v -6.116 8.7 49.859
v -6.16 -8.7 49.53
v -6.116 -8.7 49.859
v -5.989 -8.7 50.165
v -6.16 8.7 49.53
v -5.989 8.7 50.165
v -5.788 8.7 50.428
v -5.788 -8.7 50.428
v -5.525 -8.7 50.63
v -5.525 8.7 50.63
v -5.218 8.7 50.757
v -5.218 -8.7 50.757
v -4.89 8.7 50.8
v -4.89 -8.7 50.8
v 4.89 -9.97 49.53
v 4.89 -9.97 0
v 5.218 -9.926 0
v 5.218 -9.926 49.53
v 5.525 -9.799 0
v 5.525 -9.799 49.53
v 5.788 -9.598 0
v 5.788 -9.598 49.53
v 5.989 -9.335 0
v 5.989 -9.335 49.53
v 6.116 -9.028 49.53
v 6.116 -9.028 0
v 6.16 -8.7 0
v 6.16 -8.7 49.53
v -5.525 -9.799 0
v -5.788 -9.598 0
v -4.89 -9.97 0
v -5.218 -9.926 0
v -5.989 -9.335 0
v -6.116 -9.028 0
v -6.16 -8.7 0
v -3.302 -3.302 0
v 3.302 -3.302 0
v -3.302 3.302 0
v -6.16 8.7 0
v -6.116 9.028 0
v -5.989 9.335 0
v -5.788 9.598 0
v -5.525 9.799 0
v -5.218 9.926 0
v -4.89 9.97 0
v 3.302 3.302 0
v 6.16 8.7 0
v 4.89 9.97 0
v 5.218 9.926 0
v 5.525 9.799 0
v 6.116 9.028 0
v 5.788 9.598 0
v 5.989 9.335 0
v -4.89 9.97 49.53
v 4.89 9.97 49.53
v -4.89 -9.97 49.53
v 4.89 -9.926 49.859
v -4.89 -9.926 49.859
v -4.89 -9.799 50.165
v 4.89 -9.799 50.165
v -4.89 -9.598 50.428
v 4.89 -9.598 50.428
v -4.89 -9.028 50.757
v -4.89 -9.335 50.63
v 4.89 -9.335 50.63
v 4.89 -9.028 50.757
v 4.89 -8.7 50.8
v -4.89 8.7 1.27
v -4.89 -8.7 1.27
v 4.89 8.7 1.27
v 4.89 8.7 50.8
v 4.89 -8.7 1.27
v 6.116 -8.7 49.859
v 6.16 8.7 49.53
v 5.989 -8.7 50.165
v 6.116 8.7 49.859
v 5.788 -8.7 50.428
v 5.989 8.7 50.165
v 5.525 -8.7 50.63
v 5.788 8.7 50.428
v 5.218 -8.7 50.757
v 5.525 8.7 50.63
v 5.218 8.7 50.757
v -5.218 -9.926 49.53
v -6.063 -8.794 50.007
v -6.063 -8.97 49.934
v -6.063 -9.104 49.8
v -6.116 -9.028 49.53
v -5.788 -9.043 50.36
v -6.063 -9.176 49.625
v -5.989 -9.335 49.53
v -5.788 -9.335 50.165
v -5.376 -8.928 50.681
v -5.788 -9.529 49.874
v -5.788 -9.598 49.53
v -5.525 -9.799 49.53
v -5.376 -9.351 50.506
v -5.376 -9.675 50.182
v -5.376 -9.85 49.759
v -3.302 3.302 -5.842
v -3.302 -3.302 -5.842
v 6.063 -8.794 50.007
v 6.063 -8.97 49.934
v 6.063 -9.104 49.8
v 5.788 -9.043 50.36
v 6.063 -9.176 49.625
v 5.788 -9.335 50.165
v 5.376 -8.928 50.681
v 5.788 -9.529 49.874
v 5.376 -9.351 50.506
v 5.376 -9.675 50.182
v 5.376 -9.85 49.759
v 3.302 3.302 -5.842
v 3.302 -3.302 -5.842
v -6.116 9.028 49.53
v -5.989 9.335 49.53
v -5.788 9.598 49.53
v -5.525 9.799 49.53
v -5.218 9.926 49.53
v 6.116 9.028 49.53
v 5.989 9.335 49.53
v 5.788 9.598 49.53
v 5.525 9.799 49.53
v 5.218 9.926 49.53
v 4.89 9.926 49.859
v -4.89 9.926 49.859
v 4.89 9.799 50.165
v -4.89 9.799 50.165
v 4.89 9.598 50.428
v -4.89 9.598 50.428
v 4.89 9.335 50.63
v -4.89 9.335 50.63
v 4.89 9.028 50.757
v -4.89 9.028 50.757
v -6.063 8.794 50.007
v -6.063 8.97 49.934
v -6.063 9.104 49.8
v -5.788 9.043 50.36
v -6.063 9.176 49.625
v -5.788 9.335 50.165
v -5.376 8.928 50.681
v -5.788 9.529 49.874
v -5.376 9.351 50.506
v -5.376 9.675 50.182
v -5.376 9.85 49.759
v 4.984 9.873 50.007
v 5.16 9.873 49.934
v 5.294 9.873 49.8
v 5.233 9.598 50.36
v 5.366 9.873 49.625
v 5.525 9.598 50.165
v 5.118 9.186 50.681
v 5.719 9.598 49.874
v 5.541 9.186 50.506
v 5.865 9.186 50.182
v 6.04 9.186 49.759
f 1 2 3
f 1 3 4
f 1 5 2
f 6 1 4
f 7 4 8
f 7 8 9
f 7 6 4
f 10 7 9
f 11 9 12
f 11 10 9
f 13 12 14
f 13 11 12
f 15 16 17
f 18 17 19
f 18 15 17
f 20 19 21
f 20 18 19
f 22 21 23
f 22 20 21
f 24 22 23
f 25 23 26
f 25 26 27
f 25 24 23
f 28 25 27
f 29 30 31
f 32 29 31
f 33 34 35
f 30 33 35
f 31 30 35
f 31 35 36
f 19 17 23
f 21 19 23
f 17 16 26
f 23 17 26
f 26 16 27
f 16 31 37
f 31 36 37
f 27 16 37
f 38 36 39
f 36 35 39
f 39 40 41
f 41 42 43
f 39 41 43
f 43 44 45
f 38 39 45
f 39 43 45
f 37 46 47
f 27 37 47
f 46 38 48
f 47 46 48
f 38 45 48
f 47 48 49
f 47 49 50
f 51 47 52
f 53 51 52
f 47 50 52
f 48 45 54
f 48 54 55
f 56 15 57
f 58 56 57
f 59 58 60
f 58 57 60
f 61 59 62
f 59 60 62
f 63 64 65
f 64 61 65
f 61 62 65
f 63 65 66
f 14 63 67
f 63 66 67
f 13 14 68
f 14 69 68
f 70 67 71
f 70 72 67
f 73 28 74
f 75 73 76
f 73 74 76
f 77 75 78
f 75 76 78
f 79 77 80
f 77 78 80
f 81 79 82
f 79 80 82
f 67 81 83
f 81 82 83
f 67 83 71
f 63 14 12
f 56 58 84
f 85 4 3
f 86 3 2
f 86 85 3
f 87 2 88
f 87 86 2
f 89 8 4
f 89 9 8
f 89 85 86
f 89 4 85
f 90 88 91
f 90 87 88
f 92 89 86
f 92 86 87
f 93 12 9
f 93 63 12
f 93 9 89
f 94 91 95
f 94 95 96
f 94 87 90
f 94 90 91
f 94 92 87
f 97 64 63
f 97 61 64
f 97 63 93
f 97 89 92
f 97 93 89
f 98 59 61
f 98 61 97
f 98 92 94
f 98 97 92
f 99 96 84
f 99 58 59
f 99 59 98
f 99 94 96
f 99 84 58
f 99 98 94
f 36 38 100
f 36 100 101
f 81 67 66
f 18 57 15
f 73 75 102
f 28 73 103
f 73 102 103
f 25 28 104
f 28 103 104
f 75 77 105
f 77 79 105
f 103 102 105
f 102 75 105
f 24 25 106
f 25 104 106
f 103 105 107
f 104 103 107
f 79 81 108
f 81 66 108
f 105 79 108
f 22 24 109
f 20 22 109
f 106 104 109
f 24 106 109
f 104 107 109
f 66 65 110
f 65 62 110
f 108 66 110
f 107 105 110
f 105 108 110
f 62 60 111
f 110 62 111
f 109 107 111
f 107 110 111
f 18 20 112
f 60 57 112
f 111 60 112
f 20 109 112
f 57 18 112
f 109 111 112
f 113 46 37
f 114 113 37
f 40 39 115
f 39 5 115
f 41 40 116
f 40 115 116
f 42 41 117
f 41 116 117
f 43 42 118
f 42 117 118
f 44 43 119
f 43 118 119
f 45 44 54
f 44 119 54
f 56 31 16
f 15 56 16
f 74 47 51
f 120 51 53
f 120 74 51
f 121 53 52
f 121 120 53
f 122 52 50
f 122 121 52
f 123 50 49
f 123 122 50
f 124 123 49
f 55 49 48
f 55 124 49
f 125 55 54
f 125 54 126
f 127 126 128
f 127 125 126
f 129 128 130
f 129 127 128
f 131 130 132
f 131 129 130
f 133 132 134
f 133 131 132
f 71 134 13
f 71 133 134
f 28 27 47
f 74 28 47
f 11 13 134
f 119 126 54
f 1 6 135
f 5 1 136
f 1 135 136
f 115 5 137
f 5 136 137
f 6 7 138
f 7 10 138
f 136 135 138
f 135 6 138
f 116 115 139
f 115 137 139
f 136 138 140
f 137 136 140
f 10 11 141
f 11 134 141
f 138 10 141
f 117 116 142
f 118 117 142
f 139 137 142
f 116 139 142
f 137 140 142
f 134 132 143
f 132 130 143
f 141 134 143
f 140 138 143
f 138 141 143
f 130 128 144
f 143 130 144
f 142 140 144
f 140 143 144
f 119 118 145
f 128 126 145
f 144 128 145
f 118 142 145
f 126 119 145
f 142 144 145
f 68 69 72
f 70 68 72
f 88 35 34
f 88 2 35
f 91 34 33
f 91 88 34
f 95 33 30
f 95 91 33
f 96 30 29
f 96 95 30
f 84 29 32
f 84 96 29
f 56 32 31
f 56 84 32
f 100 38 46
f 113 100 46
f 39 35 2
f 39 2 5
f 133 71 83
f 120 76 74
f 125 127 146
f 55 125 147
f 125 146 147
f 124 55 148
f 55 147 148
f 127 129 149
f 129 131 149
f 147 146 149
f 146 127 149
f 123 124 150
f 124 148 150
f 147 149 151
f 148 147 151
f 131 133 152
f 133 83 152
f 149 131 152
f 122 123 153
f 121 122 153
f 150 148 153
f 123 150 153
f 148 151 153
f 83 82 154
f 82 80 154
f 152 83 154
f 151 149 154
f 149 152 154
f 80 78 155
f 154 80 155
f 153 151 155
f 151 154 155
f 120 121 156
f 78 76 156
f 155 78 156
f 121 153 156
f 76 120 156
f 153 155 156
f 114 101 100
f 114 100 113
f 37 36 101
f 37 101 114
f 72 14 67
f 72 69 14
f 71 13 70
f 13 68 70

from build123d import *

# Parameters (mm, degrees)
F0_W     = 12.319
F0_H     = 19.939
F1_DEPTH = 50.8
F2_T     = -1.27
F3_R     = 1.26999
F4_W     = 6.604
F4_H     = 6.604
F5_DEPTH = 5.842


# Not quite as in the source:
# - a fillet or chamfer is up to 0.001 mm smaller than in the source, because OpenCascade refuses the exact size


with BuildPart() as f1:
    # F0 (on Top) → F1 (new body)
    with BuildSketch(Plane.XY):
        Rectangle(F0_W, F0_H)
    extrude(amount=F1_DEPTH)

    # F2
    f2_openings = [f1.faces().sort_by_distance(p)[0] for p in [
        (0, 0, 50.8),
    ]]
    offset(amount=F2_T, openings=f2_openings)

    # F3 (radius 1.27 in the source; OpenCascade refuses exactly that, so slightly less here)
    f3_edges = [f1.edges().sort_by_distance(p)[0] for p in [
        (0, -9.9695, 50.8),
        (6.1595, 0, 50.8),
        (0, 9.9695, 50.8),
        (-6.1595, 0, 50.8),
        (-6.1595, -9.9695, 25.4),
        (6.1595, -9.9695, 25.4),
        (6.1595, 9.9695, 25.4),
        (-6.1595, 9.9695, 25.4),
    ]]
    fillet(f3_edges, radius=F3_R)

    # F4 (on face) → F5 (join)
    with BuildSketch(Plane(origin=(0, 0, 0), x_dir=(1, 0, 0), z_dir=(0, 0, -1))):
        Rectangle(F4_W, F4_H)
    extrude(amount=F5_DEPTH)


solid = f1.part
